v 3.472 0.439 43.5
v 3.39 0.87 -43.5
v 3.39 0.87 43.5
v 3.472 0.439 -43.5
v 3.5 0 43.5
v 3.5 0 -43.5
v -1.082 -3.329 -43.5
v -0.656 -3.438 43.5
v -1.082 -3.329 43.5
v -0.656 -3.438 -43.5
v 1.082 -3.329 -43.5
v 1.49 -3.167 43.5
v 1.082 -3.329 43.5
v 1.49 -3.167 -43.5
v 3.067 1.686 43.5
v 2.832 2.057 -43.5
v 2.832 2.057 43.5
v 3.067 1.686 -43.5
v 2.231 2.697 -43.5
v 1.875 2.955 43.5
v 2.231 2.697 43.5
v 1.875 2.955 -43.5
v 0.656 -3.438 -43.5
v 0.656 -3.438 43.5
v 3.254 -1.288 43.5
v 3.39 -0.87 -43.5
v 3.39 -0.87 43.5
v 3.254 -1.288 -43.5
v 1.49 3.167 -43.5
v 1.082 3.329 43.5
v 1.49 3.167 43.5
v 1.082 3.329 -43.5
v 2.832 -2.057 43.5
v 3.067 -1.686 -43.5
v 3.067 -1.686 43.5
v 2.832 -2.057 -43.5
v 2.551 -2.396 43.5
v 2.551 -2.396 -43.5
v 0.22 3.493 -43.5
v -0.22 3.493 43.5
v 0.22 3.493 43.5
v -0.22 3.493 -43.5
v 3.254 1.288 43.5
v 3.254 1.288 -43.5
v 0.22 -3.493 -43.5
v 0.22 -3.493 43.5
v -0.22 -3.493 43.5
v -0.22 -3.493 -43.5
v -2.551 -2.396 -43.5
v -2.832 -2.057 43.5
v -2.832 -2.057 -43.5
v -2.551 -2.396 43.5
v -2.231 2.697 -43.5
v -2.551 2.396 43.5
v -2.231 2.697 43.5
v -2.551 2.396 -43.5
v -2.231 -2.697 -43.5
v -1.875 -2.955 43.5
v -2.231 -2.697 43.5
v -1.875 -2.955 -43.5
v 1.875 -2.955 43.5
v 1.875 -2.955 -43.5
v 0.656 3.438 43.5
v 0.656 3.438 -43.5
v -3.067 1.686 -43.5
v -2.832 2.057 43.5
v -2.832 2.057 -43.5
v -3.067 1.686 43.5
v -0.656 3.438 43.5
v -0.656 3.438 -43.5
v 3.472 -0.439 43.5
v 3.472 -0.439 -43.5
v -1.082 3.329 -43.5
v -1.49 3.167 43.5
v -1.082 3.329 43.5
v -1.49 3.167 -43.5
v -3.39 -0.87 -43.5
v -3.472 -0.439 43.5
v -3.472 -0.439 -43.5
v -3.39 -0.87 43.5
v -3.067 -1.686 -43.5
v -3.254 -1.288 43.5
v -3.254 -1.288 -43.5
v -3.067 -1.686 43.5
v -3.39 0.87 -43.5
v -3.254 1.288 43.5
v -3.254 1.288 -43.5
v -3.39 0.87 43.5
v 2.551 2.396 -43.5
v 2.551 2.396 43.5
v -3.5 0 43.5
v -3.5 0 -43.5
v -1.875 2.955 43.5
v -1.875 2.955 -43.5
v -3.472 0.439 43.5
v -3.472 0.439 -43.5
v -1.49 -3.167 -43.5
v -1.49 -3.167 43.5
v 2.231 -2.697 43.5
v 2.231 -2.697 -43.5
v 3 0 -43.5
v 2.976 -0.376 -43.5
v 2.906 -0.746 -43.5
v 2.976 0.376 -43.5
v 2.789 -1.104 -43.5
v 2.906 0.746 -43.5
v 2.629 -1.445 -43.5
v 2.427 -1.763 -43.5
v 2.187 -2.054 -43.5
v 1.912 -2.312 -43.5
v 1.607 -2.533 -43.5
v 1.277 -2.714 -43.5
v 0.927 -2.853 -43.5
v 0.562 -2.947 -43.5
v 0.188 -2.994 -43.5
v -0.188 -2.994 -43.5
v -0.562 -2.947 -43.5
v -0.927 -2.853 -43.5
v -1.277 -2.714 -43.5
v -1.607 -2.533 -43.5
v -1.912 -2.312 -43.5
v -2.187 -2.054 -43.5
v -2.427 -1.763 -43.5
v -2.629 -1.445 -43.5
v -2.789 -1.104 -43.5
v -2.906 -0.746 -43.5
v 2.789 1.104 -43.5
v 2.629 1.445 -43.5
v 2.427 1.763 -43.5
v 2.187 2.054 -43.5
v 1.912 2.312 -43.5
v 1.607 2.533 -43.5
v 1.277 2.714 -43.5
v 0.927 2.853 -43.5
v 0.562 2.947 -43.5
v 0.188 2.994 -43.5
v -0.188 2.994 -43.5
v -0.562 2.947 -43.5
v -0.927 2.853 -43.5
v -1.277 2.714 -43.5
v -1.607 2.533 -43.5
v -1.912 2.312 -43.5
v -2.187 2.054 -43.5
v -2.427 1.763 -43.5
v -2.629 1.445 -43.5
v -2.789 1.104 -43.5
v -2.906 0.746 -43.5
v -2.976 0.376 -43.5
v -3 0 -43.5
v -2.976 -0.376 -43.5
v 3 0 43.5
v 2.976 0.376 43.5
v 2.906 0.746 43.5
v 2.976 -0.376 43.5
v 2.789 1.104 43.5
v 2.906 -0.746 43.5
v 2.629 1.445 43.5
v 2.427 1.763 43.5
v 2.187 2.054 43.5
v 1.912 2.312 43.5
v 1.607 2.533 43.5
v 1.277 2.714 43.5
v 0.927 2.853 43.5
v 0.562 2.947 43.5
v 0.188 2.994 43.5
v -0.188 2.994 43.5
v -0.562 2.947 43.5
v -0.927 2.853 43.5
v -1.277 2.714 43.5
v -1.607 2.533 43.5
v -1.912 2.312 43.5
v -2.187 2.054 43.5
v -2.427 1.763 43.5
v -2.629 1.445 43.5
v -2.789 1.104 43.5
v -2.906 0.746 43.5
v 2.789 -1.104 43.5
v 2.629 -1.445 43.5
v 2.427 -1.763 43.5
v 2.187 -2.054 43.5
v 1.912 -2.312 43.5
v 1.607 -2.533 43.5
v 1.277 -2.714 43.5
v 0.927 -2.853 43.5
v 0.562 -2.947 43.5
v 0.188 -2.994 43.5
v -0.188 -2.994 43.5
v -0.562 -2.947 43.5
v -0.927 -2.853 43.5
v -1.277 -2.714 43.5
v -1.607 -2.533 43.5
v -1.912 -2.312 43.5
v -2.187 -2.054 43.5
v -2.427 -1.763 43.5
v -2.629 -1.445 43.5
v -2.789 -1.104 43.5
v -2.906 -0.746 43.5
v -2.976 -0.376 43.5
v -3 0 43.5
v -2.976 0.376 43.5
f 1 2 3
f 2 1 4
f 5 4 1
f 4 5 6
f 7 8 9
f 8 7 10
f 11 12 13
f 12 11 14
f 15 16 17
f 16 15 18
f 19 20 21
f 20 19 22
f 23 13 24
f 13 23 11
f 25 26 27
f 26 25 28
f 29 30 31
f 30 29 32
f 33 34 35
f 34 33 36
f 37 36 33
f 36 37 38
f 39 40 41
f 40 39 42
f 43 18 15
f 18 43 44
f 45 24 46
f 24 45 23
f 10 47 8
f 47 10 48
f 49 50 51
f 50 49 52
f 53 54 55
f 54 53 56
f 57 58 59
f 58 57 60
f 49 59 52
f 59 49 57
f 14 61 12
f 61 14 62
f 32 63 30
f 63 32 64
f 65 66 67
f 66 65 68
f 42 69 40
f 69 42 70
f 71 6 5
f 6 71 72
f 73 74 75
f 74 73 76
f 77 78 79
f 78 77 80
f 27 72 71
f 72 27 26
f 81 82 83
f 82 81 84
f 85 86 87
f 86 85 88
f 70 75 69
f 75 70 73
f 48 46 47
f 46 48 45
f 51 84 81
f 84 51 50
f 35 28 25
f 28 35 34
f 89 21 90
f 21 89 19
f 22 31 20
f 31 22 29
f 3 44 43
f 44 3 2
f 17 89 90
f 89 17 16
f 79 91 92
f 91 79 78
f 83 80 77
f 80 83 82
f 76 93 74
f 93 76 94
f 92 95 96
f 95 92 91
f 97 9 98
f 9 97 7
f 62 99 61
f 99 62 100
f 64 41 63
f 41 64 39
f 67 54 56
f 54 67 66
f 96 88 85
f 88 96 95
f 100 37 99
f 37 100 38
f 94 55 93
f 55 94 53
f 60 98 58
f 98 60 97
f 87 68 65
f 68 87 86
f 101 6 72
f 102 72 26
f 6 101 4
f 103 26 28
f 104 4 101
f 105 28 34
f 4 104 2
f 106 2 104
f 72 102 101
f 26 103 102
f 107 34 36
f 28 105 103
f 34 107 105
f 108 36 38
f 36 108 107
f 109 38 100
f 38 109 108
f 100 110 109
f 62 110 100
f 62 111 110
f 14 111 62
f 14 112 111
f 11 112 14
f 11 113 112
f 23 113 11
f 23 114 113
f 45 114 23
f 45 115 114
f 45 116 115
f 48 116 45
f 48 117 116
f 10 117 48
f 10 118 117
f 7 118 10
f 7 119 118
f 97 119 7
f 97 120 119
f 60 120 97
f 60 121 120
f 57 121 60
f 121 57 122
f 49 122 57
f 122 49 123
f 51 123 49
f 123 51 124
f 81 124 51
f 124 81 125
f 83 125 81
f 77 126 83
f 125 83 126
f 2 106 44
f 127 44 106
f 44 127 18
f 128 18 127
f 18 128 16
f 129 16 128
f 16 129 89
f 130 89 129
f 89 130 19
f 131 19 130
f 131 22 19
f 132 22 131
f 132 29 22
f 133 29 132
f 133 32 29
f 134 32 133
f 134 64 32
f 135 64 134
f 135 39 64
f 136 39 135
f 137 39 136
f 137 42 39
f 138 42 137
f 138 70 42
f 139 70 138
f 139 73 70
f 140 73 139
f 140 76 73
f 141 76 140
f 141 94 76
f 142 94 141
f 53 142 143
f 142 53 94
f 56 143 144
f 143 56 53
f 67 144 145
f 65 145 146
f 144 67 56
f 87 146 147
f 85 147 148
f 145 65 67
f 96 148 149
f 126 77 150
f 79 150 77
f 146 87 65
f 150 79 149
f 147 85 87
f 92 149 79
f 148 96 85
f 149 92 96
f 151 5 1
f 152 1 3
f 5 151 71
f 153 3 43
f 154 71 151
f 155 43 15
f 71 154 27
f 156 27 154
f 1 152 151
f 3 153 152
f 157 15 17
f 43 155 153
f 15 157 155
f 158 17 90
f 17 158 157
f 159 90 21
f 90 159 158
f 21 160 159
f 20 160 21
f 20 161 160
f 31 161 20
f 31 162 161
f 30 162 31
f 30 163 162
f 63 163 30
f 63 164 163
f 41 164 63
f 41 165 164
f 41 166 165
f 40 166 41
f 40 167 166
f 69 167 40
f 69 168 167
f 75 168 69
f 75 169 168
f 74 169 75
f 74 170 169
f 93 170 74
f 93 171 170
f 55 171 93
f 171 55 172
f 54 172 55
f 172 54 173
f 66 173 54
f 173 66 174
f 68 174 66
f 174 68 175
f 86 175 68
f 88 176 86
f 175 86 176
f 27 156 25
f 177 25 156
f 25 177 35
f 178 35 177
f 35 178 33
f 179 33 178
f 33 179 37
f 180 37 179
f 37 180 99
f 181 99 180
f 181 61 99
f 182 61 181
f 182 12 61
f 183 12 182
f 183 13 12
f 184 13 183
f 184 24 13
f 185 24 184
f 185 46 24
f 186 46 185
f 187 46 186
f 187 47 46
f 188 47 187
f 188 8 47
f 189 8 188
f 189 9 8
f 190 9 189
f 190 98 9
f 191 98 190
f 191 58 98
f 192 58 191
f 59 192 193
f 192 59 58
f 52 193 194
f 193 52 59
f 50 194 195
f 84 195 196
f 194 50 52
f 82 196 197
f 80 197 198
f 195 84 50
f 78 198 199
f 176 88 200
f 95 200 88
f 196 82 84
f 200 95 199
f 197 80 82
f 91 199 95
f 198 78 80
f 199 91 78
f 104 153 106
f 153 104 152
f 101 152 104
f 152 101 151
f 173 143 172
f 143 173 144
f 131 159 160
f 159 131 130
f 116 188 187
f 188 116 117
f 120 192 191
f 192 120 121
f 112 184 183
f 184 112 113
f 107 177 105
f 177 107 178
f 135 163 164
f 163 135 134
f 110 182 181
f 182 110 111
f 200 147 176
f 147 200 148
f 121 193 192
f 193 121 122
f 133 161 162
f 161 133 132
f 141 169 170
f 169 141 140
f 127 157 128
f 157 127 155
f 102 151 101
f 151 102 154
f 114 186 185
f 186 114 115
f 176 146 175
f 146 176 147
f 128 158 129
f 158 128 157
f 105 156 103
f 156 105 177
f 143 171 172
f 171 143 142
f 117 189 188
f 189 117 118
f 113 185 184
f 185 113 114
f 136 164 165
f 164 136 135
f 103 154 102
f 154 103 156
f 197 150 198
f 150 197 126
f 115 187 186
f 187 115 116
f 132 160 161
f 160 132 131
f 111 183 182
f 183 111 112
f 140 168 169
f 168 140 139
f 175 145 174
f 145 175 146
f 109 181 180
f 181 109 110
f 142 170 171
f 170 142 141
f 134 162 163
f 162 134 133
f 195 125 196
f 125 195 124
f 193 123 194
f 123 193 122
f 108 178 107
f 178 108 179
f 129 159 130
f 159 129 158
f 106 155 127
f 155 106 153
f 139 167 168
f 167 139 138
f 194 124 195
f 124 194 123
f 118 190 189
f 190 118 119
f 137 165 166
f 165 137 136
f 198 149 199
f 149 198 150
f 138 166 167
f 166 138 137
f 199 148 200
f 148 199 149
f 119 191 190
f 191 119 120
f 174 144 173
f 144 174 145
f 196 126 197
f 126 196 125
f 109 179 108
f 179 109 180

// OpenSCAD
$fn = 50;


difference() {
	union() {
		translate(v = [0, 0, -43.5000000000]) {
			cylinder(h = 87, r = 3.5000000000);
		}
	}
	union() {
		translate(v = [0, 0, -100.0000000000]) {
			cylinder(h = 200, r = 3.0000000000);
		}
	}
}
